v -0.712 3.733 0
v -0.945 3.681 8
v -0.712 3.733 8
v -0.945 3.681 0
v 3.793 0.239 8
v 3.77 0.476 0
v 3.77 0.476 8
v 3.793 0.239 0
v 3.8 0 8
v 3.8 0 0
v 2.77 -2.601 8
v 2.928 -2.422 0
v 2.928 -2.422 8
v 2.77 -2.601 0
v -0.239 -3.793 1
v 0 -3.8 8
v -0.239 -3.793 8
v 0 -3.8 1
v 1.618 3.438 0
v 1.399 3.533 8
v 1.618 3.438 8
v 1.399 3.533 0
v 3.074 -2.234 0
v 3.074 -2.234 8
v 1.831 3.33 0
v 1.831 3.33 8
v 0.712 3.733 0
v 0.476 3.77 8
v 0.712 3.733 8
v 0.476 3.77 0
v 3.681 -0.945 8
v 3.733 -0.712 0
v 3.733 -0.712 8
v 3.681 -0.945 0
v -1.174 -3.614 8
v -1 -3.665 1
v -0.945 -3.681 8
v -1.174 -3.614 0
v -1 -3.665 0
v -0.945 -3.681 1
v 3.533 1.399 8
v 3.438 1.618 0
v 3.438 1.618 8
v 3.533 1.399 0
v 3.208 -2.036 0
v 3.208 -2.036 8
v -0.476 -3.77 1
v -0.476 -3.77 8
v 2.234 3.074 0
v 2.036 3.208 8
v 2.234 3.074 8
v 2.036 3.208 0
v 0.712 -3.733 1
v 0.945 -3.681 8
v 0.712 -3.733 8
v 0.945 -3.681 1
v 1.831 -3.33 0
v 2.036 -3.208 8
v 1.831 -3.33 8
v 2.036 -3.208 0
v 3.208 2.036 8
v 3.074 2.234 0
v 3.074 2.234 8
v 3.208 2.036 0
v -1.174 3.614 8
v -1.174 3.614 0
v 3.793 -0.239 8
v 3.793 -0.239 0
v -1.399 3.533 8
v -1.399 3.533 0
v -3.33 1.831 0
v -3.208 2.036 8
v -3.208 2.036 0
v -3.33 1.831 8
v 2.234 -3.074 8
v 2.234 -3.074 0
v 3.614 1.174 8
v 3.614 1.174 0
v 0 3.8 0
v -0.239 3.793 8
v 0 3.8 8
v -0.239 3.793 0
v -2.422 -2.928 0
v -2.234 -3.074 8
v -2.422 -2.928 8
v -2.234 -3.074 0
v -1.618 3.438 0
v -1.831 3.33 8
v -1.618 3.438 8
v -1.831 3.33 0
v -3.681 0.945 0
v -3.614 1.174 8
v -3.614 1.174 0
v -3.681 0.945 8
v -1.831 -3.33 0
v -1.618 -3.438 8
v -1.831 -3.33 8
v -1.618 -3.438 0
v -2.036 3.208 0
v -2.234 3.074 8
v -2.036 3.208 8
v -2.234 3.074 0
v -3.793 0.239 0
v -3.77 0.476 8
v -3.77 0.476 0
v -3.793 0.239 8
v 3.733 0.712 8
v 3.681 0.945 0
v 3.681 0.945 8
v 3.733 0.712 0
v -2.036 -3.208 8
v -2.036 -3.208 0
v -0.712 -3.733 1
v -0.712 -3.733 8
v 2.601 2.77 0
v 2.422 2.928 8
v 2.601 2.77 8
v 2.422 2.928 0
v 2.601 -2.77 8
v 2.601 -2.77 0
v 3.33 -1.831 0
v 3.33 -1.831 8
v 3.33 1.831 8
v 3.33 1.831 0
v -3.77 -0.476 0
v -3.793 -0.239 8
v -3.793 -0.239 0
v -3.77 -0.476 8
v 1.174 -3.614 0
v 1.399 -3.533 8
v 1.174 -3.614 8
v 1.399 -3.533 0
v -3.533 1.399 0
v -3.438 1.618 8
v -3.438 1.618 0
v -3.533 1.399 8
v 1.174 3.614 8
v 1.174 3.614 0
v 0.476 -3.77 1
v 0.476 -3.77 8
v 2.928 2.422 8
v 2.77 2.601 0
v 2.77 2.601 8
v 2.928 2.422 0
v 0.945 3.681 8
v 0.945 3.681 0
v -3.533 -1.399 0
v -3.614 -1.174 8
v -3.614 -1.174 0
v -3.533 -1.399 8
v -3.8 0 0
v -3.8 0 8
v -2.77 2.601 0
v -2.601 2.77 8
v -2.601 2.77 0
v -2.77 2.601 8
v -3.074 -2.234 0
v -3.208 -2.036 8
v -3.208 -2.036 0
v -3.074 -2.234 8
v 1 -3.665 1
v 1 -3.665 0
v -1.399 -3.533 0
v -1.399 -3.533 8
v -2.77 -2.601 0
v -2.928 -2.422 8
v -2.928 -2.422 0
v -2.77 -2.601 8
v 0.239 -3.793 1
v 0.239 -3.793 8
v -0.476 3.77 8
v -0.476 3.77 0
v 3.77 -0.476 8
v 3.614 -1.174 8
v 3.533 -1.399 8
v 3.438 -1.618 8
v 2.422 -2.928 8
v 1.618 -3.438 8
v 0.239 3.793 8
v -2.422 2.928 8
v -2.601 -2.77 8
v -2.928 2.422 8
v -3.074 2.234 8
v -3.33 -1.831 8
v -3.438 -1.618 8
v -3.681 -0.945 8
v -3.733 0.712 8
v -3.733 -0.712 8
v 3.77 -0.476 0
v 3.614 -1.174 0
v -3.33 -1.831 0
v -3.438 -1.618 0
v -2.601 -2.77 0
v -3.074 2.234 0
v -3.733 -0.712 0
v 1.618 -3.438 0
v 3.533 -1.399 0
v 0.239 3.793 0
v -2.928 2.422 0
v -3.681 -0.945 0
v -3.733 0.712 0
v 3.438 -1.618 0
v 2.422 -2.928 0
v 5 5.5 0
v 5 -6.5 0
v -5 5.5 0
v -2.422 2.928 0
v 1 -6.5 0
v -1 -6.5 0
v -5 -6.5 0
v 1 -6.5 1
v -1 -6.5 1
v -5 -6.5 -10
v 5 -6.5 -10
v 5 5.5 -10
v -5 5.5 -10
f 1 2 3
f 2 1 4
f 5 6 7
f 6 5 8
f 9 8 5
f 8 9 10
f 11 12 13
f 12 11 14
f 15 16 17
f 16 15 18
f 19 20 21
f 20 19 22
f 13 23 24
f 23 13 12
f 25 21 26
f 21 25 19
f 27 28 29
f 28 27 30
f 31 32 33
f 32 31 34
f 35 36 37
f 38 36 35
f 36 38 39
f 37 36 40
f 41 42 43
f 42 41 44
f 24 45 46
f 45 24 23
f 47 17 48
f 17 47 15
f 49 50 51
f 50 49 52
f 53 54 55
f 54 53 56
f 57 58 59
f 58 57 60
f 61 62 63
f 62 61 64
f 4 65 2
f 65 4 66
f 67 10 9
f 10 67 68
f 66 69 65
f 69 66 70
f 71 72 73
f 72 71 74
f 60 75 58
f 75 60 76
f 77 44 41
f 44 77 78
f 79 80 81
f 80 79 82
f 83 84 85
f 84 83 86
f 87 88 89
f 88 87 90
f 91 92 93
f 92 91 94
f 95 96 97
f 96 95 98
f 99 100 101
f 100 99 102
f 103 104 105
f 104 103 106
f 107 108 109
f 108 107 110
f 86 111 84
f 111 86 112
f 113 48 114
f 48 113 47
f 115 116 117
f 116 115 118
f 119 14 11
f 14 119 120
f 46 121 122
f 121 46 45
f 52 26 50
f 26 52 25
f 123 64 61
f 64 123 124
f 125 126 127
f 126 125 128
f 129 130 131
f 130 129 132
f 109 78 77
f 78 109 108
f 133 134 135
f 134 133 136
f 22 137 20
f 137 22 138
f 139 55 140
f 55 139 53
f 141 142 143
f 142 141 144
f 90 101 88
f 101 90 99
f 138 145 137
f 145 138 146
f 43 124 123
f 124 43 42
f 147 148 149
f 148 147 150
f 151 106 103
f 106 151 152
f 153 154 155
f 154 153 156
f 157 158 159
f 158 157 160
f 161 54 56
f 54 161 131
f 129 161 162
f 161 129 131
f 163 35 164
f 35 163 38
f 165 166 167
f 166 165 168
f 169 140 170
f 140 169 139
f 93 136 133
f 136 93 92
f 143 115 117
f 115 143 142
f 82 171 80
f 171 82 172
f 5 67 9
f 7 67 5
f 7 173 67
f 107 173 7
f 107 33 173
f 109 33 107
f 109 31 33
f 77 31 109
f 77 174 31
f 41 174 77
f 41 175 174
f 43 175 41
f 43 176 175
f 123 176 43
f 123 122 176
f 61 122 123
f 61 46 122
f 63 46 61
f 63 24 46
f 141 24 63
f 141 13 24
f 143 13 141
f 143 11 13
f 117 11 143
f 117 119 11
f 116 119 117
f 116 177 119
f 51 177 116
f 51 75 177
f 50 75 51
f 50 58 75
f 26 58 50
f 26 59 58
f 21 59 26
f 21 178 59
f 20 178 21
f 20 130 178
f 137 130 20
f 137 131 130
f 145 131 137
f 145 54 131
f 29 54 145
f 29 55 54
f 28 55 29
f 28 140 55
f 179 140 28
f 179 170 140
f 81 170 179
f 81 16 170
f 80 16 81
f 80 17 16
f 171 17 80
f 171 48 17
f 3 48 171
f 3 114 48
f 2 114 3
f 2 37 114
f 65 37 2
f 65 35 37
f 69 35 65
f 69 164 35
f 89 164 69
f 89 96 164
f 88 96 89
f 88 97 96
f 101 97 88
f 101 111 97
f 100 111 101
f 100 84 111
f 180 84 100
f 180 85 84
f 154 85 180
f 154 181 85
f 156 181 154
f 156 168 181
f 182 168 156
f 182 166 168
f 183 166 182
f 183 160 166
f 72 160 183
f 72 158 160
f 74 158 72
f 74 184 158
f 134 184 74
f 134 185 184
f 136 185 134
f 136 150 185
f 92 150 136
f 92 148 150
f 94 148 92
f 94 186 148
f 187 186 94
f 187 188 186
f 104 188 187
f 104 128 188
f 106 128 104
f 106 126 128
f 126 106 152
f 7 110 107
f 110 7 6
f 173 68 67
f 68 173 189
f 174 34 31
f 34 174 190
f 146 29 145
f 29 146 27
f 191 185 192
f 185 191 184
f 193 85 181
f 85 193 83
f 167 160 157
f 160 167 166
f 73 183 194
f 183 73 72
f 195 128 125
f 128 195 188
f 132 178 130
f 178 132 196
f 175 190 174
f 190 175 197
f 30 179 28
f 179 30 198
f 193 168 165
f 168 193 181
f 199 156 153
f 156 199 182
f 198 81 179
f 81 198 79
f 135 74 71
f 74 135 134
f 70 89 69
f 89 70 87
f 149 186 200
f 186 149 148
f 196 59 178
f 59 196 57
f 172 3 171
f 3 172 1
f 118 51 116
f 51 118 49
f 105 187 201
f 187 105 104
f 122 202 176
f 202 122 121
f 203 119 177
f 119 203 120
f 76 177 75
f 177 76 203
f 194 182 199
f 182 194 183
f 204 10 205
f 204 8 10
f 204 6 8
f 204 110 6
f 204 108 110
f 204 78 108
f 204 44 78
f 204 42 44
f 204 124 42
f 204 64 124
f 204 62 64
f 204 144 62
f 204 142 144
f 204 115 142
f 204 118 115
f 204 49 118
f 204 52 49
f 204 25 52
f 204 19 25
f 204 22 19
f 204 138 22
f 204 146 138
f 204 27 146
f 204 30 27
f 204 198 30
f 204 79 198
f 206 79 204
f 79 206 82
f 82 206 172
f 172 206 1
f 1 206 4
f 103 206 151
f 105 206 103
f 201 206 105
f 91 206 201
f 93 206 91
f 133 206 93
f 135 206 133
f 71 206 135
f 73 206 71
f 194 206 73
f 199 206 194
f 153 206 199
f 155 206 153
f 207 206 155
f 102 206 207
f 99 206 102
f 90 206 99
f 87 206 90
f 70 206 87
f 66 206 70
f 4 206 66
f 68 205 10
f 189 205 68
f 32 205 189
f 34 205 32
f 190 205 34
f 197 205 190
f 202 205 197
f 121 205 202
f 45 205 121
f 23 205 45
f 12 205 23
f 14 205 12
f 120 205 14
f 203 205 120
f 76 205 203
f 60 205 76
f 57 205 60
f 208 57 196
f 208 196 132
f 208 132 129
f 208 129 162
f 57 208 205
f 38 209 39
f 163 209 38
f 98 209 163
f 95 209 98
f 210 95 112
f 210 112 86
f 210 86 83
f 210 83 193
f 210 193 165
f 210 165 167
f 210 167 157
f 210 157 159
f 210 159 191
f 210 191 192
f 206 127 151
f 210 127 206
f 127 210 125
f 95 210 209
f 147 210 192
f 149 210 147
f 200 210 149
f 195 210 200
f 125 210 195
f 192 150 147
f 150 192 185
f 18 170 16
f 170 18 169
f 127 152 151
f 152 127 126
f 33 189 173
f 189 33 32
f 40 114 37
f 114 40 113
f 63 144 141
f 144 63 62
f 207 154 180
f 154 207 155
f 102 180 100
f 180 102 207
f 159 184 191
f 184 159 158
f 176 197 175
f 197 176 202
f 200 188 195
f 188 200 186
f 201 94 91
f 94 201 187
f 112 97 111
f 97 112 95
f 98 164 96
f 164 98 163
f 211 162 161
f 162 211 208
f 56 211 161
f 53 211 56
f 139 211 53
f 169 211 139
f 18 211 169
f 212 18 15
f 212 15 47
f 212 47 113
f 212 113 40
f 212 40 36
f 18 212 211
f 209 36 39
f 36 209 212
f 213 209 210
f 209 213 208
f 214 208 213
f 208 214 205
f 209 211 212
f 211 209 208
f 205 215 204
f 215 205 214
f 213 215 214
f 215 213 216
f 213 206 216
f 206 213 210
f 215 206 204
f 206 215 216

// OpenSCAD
// Based on Alpha RD901F

tolerance = 0.3;
$fn = $preview ? 20 : 100;

module pot_rd901f() {
    // translate([0, 0, -1])
    cylinder(r = 3.5 + tolerance, h = 8);

    translate([-1, -6.5, 0])
    cube([2, 3, 1]);
    
    translate([0, 0, -10])
        union() {
            translate([-5, -6.5, 0])
            cube([10, 12, 10]);
        }
}

pot_rd901f();
